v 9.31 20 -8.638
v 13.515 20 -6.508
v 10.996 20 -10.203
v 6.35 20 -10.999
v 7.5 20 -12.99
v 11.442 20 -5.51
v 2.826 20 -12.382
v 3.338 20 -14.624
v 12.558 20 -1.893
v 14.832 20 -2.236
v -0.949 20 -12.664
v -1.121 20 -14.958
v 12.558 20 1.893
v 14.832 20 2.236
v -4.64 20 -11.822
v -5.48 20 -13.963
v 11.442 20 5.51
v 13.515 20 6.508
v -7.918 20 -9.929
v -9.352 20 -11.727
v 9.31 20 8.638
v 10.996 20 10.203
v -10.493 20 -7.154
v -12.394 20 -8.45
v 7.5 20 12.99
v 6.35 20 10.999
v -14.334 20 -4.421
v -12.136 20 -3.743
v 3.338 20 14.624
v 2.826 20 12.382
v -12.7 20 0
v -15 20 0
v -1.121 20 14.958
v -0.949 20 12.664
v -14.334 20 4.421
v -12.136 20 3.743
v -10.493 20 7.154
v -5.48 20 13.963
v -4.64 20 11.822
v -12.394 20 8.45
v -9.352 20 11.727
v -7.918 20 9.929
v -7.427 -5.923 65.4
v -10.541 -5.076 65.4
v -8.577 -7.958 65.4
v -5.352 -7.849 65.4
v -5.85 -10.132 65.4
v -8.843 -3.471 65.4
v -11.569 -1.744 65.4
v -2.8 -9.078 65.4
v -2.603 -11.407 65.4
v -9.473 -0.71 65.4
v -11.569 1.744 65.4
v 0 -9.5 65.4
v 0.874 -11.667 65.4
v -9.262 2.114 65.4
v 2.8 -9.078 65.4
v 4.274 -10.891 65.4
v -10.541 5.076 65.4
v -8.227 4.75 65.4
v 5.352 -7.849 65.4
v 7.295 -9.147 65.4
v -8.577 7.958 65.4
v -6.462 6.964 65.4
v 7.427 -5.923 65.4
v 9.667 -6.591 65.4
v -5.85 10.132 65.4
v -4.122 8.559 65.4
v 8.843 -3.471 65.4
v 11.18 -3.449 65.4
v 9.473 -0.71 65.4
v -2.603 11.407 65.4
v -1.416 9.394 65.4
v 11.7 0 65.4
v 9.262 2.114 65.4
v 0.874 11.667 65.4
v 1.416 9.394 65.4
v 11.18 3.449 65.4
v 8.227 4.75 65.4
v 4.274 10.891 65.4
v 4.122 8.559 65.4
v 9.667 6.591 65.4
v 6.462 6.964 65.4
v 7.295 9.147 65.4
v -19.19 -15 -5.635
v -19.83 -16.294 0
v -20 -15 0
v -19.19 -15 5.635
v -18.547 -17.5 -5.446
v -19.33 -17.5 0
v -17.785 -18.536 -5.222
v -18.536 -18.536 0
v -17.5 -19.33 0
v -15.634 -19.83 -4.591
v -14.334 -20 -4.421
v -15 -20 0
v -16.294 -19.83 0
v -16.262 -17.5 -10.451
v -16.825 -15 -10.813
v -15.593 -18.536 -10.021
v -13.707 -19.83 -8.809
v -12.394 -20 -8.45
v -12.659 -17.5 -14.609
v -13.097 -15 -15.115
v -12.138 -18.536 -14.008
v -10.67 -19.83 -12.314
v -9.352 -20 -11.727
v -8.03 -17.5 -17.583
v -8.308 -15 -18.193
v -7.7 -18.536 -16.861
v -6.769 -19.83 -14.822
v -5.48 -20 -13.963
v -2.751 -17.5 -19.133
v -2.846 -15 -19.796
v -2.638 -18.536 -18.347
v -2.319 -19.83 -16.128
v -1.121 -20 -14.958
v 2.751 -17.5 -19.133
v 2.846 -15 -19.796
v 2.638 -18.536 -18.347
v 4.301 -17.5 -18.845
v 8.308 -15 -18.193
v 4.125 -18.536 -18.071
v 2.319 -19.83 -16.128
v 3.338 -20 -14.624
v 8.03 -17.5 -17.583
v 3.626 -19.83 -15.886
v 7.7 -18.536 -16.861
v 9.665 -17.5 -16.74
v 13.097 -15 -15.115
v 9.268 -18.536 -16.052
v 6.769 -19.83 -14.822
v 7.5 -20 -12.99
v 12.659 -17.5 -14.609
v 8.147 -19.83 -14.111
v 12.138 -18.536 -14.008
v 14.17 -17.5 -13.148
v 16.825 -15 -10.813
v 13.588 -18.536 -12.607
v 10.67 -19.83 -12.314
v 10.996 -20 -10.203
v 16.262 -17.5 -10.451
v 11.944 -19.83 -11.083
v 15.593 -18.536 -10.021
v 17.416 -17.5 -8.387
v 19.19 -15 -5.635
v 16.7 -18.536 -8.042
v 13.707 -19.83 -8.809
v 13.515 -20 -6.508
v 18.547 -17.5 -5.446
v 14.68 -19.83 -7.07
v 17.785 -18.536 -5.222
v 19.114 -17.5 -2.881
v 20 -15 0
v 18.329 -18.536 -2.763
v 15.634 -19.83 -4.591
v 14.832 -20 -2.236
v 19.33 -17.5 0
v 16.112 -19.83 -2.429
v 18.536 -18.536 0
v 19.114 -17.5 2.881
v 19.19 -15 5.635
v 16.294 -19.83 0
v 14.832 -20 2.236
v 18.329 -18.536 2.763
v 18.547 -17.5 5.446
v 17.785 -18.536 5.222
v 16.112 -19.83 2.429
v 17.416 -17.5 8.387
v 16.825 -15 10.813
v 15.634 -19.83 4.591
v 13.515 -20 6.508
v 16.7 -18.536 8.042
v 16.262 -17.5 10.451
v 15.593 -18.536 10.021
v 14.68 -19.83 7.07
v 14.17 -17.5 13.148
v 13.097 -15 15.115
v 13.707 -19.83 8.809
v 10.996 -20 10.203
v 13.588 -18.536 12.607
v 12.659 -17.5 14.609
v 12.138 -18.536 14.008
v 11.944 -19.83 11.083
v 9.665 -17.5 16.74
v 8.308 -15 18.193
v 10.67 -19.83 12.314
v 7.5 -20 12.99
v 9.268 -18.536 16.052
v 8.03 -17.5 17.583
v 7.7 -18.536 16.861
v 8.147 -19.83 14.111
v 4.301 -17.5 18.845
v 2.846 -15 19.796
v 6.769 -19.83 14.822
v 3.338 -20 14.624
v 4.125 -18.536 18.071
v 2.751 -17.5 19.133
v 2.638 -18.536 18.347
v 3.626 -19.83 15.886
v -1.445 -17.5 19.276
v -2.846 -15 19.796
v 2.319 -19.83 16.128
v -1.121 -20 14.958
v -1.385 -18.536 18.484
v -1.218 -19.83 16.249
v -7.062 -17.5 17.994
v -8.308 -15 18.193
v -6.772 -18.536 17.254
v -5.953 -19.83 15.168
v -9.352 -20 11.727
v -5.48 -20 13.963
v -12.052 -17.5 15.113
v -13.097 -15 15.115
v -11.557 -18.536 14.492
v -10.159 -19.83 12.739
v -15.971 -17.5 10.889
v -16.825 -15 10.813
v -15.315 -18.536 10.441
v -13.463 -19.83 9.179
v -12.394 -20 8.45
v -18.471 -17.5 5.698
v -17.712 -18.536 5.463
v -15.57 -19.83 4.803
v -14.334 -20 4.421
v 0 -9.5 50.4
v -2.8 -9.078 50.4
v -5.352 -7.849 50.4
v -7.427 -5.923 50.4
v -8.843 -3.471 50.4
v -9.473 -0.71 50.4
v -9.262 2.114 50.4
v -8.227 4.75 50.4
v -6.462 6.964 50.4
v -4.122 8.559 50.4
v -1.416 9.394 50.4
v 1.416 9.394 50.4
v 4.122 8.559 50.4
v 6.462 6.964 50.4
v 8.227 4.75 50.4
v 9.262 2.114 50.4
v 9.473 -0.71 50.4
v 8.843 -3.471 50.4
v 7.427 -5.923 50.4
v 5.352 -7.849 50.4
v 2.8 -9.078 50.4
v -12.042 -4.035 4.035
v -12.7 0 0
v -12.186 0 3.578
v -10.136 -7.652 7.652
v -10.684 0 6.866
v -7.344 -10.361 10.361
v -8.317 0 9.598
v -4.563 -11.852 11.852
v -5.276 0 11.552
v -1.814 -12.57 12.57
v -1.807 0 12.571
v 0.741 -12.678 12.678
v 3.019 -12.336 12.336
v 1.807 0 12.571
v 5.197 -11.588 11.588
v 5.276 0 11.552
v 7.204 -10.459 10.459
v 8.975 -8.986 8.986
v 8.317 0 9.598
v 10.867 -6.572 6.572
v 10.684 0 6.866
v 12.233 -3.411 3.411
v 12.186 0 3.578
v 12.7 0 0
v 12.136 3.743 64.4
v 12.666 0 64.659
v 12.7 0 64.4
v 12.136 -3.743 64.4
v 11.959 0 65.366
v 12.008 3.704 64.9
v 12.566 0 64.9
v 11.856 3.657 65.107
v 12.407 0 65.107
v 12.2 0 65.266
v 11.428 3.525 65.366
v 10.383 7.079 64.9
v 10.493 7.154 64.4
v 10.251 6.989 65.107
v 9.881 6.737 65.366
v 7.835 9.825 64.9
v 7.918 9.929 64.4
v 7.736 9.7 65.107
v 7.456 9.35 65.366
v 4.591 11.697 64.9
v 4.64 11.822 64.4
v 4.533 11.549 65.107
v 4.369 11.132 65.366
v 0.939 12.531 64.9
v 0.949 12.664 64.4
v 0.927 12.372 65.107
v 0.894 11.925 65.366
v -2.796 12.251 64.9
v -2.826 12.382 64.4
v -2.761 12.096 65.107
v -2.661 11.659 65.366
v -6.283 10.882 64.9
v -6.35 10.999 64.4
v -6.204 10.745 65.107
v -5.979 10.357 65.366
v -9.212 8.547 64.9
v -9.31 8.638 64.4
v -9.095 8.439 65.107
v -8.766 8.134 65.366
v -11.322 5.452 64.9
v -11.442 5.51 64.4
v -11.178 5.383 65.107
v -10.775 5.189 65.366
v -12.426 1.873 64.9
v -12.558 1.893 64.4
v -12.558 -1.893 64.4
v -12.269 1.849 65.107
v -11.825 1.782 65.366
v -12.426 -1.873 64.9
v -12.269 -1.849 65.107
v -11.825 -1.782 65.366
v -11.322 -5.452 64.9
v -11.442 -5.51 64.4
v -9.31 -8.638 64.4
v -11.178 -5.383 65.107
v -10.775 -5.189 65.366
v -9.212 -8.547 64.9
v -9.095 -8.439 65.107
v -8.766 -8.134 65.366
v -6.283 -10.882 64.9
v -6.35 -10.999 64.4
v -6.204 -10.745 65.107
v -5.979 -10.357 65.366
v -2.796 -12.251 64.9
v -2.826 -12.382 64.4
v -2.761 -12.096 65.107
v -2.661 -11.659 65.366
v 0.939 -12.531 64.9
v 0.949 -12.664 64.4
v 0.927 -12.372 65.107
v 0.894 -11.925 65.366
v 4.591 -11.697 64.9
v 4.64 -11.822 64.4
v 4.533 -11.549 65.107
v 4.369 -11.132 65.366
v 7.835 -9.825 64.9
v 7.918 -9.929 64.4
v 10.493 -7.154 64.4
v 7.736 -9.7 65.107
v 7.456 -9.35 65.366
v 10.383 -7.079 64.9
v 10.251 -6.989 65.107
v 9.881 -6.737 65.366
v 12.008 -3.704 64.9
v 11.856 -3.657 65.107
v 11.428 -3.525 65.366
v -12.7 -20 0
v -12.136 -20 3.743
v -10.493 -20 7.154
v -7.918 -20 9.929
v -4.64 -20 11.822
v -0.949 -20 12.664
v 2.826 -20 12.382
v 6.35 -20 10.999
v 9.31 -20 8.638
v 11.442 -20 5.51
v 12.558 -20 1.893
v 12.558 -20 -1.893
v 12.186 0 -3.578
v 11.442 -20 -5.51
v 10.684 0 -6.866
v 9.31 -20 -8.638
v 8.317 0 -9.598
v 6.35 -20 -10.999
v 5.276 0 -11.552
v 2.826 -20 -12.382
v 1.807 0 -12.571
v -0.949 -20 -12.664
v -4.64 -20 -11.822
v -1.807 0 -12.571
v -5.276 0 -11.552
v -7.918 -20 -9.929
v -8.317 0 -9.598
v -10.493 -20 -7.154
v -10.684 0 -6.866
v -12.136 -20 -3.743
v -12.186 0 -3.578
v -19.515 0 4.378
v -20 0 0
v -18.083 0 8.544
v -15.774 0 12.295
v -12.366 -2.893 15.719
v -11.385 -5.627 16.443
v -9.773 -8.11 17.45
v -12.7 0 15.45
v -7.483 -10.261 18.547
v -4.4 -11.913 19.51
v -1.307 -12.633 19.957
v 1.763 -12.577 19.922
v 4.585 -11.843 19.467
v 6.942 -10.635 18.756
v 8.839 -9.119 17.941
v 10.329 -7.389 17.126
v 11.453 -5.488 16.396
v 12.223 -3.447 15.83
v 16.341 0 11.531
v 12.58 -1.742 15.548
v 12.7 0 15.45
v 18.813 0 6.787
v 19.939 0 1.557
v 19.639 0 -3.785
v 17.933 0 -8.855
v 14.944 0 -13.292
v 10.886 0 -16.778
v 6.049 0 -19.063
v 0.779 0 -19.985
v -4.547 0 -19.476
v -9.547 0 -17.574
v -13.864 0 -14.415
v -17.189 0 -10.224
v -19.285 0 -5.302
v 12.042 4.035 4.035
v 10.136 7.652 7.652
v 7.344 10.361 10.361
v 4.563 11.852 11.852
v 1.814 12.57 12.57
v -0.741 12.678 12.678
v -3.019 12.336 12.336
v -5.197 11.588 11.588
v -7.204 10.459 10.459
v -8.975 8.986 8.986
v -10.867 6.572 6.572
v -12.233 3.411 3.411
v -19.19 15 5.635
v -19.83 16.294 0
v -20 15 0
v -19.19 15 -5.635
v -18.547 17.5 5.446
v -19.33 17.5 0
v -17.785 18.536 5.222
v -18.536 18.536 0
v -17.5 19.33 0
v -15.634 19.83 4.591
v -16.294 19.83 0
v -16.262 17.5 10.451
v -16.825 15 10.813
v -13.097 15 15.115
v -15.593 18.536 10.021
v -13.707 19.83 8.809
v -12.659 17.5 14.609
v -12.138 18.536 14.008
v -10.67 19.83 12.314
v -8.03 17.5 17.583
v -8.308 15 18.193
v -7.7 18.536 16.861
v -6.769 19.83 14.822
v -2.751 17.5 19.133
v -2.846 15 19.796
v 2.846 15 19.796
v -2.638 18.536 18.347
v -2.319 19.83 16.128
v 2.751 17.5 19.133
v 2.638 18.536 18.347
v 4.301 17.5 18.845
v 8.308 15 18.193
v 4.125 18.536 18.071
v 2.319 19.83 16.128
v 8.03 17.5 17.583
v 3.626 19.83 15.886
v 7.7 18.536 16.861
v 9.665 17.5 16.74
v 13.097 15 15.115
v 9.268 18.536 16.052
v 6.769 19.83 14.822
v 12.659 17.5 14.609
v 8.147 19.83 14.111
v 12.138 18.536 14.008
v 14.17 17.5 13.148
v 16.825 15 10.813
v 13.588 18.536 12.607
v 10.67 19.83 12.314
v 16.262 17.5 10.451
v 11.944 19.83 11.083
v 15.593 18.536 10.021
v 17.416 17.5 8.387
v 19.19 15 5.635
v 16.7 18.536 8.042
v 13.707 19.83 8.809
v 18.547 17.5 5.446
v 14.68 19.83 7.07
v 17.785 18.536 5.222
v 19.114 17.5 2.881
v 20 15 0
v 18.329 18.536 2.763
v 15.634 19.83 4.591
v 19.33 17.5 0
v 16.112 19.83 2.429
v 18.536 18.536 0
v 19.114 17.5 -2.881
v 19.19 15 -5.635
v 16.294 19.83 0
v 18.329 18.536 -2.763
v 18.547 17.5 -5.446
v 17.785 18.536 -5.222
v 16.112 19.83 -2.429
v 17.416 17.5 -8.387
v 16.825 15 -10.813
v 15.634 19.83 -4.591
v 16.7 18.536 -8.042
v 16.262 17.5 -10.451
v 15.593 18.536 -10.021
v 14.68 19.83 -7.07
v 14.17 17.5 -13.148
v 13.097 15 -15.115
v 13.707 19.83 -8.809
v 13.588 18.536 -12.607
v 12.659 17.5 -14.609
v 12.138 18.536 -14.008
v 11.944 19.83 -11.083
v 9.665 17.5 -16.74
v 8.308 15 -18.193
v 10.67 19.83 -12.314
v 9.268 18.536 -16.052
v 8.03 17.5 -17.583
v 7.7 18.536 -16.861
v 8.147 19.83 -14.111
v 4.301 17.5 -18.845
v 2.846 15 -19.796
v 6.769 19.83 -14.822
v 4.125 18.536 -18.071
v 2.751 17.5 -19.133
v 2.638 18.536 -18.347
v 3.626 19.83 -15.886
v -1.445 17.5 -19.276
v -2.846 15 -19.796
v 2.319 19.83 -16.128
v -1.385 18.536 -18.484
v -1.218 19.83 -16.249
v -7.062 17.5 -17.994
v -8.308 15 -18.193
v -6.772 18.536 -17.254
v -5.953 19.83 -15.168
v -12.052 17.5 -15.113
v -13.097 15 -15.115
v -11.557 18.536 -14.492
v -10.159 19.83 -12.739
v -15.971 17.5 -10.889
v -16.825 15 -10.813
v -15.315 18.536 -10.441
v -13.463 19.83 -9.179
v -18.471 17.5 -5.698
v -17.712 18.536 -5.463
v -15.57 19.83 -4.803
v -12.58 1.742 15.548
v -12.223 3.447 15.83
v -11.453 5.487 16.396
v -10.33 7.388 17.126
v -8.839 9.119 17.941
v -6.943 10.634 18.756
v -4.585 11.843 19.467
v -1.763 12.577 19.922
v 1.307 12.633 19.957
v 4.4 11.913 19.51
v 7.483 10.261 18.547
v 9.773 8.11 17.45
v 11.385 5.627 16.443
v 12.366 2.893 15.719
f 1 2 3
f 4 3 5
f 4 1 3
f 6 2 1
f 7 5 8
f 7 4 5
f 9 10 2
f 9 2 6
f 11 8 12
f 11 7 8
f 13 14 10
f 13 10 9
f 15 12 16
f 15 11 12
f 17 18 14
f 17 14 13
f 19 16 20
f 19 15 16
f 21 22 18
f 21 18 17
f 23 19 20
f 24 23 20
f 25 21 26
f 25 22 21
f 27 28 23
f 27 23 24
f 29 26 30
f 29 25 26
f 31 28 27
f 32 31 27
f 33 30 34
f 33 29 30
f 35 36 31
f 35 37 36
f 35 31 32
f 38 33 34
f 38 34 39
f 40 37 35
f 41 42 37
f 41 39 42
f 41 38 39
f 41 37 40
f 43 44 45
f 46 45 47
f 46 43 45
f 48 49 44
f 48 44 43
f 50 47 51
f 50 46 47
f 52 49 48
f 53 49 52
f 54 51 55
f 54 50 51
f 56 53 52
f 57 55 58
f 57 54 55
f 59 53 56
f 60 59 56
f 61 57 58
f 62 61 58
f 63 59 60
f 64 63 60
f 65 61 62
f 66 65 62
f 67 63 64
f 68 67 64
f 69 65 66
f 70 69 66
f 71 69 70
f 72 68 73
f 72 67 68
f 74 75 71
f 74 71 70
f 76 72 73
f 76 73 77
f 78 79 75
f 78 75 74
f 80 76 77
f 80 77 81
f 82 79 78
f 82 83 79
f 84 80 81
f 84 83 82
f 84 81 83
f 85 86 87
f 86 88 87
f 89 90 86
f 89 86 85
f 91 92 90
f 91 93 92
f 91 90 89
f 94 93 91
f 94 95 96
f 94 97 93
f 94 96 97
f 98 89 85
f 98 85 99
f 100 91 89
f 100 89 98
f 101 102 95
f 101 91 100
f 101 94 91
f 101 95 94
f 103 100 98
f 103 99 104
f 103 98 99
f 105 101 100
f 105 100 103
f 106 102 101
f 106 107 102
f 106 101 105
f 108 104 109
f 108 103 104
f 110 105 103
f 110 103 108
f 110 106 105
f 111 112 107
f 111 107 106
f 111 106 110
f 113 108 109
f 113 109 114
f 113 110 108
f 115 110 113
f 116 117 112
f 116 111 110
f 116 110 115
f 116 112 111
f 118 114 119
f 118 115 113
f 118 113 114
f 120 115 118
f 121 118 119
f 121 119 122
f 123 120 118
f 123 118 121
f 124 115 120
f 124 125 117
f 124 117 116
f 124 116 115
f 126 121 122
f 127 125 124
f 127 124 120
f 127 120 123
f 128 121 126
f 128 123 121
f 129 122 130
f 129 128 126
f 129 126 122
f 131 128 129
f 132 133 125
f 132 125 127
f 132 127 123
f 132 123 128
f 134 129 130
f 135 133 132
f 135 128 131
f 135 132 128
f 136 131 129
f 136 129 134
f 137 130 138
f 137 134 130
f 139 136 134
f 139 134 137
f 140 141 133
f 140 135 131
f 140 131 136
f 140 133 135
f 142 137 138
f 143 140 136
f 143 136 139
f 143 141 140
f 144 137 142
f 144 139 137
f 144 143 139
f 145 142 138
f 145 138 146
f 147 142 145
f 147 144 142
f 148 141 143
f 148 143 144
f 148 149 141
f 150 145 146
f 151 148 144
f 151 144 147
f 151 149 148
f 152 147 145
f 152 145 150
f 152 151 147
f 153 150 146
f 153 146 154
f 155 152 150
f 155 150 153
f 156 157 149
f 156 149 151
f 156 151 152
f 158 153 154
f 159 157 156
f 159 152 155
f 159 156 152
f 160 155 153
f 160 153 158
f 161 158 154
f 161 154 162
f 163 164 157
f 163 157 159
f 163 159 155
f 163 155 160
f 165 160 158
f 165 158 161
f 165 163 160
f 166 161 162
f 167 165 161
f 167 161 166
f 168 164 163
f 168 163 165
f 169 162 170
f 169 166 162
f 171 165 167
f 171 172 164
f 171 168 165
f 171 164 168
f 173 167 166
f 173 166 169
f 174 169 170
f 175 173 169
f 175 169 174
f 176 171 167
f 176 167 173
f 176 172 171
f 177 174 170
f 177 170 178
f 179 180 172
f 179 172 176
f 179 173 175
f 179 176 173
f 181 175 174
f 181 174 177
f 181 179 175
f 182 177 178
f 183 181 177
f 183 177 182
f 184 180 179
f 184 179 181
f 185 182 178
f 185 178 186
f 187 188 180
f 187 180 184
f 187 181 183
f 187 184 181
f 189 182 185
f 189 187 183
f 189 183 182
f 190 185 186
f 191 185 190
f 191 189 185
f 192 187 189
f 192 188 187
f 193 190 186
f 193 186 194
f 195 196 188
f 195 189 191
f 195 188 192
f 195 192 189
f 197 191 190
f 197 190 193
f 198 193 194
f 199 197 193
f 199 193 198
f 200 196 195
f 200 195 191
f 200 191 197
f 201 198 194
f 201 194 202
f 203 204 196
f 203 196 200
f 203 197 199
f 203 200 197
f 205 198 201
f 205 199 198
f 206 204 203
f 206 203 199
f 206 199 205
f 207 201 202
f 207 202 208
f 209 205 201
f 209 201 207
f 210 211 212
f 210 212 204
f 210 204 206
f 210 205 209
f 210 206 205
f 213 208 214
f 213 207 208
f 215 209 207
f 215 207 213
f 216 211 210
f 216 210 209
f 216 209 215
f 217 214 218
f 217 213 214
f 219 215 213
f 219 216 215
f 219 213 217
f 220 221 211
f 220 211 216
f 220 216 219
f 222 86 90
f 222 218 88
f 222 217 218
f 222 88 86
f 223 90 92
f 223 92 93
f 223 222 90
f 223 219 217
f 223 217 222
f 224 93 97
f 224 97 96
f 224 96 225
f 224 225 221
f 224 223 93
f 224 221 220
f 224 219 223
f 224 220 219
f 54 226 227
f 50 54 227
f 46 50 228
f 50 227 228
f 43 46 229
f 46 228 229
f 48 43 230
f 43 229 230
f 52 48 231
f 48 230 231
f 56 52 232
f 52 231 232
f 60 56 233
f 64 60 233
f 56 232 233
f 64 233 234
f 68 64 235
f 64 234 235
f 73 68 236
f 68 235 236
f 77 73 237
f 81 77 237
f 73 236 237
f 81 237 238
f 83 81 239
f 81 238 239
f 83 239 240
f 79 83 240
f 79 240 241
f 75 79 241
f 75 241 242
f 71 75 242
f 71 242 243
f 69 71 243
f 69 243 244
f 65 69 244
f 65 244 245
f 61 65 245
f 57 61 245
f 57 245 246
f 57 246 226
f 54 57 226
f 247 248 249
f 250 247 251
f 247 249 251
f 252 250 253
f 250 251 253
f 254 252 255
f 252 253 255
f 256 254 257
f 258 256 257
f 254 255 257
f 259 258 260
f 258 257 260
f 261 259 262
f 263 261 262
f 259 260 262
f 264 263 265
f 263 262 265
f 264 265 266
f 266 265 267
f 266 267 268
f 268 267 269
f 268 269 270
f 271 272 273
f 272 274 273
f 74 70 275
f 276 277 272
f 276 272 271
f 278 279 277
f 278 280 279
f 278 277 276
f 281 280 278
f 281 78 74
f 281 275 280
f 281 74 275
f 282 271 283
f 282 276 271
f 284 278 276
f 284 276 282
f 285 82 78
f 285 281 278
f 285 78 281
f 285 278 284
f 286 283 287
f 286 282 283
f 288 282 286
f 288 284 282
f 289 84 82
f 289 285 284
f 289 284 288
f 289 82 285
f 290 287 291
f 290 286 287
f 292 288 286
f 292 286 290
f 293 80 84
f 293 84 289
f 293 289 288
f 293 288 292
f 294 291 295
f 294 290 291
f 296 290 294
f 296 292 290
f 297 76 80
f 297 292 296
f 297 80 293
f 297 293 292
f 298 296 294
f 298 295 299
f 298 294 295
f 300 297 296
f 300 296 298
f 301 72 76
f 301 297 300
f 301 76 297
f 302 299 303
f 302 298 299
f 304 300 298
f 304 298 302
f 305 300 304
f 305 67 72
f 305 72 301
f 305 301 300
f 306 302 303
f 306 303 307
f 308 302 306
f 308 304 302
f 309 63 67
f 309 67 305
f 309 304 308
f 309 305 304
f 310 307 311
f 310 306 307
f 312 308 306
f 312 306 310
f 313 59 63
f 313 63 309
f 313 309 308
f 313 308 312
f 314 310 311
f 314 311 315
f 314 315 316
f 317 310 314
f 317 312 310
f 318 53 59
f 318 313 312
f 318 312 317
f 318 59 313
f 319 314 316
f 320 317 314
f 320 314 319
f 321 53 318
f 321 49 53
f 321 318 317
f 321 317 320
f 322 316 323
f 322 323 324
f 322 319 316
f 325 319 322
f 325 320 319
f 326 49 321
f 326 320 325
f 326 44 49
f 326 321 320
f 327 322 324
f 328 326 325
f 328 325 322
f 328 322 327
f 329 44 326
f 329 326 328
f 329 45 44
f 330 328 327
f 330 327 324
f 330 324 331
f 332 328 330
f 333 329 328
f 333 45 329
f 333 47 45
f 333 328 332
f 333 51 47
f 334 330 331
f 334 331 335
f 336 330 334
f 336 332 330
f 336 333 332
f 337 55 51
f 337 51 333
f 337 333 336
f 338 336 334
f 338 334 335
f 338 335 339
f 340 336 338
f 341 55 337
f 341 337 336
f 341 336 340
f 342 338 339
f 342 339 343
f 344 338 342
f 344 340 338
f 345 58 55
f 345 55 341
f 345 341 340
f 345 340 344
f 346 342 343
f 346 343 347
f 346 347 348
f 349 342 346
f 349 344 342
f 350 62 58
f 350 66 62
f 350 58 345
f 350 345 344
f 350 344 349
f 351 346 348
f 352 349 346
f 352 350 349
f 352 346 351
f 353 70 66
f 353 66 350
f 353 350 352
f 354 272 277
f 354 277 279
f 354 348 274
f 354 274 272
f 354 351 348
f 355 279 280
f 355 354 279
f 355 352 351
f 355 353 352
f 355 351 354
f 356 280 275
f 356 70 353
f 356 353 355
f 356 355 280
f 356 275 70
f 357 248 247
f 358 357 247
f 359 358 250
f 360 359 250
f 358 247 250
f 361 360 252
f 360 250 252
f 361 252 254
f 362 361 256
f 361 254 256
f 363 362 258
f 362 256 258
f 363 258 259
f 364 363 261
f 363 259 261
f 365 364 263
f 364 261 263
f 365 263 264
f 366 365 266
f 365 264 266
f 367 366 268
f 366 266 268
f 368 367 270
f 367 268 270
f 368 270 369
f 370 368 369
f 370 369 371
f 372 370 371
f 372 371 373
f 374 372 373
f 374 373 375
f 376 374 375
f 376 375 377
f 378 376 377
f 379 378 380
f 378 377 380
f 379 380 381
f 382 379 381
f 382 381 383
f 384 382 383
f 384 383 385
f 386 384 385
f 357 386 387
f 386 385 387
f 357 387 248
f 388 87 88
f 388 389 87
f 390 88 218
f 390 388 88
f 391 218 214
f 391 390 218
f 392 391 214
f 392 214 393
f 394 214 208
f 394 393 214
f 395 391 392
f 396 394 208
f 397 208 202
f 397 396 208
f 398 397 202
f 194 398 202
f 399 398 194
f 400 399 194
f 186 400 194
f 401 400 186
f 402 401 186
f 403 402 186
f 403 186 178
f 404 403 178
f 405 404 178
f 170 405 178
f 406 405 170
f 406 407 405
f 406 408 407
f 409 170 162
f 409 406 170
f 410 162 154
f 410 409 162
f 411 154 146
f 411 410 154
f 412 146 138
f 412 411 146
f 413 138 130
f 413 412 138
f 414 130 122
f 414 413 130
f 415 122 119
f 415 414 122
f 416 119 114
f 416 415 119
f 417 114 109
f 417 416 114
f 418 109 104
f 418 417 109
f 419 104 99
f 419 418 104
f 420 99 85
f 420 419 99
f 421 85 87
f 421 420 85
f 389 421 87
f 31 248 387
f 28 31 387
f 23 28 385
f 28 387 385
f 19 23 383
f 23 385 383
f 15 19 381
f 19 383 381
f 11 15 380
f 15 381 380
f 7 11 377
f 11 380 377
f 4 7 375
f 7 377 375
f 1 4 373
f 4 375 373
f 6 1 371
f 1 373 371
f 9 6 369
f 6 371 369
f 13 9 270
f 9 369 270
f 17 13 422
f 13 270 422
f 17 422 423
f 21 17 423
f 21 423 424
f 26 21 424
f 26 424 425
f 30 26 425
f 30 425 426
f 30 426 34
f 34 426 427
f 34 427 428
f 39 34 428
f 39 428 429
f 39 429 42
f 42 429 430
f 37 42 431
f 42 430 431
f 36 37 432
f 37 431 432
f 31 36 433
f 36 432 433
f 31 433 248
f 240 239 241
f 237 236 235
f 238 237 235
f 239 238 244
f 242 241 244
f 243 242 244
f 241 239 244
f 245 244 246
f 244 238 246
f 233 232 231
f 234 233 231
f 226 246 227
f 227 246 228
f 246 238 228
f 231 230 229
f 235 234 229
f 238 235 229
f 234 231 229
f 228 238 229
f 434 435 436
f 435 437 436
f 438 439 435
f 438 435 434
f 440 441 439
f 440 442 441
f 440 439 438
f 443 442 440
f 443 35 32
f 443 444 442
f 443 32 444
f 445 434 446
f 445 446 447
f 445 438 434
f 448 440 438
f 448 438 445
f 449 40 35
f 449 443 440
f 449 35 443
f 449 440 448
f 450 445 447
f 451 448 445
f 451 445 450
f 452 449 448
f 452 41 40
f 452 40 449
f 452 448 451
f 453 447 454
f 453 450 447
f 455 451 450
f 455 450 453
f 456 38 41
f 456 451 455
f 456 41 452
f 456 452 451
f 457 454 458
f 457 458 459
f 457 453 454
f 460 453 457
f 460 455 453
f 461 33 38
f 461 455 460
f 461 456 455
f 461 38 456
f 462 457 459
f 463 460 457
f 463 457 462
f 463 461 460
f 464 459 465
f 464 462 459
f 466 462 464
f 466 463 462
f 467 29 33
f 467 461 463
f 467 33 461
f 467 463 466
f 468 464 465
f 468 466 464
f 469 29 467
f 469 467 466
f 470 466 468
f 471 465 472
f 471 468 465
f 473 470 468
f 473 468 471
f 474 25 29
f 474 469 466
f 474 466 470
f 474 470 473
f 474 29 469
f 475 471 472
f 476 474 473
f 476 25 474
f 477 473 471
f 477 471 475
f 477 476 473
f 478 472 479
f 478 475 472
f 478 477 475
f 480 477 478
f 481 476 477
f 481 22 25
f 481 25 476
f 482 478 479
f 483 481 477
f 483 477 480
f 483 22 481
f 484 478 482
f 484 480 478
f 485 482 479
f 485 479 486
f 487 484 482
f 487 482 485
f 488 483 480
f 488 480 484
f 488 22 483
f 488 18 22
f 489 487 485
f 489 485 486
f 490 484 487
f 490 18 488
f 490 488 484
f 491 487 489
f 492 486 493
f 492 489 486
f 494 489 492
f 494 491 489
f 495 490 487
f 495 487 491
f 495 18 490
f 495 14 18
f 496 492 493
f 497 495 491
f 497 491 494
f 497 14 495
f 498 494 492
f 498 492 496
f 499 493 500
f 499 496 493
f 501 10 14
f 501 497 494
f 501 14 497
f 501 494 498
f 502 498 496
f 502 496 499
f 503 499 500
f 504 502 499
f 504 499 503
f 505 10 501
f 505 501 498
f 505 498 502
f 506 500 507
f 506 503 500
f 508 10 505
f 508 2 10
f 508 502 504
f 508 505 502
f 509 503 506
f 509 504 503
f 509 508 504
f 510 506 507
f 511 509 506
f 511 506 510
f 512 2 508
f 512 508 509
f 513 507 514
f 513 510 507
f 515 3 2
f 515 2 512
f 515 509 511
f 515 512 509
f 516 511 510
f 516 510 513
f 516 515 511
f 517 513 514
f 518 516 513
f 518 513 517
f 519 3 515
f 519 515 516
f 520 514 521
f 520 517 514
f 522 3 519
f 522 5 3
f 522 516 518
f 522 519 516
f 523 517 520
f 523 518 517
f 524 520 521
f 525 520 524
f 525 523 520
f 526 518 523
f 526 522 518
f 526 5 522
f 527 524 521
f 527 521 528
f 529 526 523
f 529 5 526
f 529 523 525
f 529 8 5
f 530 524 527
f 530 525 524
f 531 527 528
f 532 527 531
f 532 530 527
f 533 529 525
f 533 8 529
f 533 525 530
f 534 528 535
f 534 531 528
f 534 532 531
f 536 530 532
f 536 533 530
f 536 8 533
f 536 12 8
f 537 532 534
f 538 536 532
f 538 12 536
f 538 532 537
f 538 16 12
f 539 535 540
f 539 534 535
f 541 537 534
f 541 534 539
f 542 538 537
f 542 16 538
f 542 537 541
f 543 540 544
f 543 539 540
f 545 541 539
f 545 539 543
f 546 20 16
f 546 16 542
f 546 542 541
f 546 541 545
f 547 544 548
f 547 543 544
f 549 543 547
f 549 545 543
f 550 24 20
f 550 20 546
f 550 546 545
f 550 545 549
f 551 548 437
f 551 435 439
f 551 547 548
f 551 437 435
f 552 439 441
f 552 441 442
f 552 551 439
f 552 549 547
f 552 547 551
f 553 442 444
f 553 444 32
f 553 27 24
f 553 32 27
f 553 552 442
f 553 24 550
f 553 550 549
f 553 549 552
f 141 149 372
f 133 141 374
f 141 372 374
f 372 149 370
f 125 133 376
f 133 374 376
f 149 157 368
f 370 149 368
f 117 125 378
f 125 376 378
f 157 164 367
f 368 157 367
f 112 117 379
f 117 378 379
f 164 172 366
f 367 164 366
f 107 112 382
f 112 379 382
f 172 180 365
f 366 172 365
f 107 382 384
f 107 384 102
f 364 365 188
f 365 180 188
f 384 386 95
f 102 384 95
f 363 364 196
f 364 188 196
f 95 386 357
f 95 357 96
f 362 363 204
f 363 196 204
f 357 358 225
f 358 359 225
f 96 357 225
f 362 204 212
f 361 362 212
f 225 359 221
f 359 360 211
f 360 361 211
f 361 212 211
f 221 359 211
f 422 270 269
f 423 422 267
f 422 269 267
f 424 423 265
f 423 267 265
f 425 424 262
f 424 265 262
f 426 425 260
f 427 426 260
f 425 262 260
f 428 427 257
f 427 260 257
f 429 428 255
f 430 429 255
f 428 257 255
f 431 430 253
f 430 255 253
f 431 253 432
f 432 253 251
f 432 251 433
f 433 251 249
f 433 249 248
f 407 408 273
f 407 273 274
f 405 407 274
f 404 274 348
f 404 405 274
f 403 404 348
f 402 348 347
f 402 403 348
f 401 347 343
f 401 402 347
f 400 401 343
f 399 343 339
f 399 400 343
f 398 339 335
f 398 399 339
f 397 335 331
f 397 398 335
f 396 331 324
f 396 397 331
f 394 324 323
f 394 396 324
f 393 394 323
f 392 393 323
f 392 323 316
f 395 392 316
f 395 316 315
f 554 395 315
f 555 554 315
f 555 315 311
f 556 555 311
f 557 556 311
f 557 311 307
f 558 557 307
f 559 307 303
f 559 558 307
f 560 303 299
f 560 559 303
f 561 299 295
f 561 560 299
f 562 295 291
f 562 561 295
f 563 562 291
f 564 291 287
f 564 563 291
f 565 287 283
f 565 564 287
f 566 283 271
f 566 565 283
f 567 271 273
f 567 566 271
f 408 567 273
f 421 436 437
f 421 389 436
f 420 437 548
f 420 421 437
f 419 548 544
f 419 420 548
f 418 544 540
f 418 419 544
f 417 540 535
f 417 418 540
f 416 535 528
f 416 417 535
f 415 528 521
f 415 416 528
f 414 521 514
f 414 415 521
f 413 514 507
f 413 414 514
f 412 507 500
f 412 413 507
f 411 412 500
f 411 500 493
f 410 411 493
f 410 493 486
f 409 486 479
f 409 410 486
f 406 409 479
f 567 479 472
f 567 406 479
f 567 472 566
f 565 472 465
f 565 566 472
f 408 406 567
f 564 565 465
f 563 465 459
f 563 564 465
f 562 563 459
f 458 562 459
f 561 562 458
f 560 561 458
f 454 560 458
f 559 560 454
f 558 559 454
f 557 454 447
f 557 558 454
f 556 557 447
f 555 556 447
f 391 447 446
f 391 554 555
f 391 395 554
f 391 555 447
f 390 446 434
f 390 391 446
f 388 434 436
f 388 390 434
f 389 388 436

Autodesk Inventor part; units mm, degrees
ref_plane "YZ Plane" through (0, 0, 0) normal (1, 0, 0) x (0, 1, 0)
ref_plane "XZ Plane" through (0, 0, 0) normal (0, 1, 0) x (-1, 0, 0)
ref_plane "XY Plane" through (0, 0, 0) normal (0, 0, 1) x (1, 0, 0)
sketch "Sketch1" plane through (0, 0, 0) normal (0, 1, 0) x (-1, 0, 0)
  circle A0 centre (0, 0) radius 12.7
  circle A1 centre (0, 0) radius 20
  dimension "d0" = 25.4
  dimension "d1" = 40
extrude "Extrusion1" add sketch "Sketch1" along normal mid plane 40
fillet "Fillet2" radius 5 2 edges at (20, 20, 0) (20, -20, 0)
sketch "Sketch6" plane through (0, 0, 0) normal (0, 0, 1) x (1, 0, 0)
  circle A0 centre (0, 0) radius 12.7
  dimension "d33" = 25.4
extrude "Extrusion6" add sketch "Sketch6" along normal blind 65.4
sketch "Sketch7" plane through (0, 0, 0) normal (0, 1, 0) x (-1, 0, 0)
  circle A0 centre (0, 0) radius 12.7
extrude "Extrusion7" cut sketch "Sketch7" along normal through all both and the other way through all
hole "Hole2" at (0, 0, 65.4) direction (0, 0, -1) diameter 19 depth 15
fillet "Fillet3" radius 1 1 edges at (-12.7, 0, 65.4)
properties part number "suporte-barra" material "Steel, Carbon"
